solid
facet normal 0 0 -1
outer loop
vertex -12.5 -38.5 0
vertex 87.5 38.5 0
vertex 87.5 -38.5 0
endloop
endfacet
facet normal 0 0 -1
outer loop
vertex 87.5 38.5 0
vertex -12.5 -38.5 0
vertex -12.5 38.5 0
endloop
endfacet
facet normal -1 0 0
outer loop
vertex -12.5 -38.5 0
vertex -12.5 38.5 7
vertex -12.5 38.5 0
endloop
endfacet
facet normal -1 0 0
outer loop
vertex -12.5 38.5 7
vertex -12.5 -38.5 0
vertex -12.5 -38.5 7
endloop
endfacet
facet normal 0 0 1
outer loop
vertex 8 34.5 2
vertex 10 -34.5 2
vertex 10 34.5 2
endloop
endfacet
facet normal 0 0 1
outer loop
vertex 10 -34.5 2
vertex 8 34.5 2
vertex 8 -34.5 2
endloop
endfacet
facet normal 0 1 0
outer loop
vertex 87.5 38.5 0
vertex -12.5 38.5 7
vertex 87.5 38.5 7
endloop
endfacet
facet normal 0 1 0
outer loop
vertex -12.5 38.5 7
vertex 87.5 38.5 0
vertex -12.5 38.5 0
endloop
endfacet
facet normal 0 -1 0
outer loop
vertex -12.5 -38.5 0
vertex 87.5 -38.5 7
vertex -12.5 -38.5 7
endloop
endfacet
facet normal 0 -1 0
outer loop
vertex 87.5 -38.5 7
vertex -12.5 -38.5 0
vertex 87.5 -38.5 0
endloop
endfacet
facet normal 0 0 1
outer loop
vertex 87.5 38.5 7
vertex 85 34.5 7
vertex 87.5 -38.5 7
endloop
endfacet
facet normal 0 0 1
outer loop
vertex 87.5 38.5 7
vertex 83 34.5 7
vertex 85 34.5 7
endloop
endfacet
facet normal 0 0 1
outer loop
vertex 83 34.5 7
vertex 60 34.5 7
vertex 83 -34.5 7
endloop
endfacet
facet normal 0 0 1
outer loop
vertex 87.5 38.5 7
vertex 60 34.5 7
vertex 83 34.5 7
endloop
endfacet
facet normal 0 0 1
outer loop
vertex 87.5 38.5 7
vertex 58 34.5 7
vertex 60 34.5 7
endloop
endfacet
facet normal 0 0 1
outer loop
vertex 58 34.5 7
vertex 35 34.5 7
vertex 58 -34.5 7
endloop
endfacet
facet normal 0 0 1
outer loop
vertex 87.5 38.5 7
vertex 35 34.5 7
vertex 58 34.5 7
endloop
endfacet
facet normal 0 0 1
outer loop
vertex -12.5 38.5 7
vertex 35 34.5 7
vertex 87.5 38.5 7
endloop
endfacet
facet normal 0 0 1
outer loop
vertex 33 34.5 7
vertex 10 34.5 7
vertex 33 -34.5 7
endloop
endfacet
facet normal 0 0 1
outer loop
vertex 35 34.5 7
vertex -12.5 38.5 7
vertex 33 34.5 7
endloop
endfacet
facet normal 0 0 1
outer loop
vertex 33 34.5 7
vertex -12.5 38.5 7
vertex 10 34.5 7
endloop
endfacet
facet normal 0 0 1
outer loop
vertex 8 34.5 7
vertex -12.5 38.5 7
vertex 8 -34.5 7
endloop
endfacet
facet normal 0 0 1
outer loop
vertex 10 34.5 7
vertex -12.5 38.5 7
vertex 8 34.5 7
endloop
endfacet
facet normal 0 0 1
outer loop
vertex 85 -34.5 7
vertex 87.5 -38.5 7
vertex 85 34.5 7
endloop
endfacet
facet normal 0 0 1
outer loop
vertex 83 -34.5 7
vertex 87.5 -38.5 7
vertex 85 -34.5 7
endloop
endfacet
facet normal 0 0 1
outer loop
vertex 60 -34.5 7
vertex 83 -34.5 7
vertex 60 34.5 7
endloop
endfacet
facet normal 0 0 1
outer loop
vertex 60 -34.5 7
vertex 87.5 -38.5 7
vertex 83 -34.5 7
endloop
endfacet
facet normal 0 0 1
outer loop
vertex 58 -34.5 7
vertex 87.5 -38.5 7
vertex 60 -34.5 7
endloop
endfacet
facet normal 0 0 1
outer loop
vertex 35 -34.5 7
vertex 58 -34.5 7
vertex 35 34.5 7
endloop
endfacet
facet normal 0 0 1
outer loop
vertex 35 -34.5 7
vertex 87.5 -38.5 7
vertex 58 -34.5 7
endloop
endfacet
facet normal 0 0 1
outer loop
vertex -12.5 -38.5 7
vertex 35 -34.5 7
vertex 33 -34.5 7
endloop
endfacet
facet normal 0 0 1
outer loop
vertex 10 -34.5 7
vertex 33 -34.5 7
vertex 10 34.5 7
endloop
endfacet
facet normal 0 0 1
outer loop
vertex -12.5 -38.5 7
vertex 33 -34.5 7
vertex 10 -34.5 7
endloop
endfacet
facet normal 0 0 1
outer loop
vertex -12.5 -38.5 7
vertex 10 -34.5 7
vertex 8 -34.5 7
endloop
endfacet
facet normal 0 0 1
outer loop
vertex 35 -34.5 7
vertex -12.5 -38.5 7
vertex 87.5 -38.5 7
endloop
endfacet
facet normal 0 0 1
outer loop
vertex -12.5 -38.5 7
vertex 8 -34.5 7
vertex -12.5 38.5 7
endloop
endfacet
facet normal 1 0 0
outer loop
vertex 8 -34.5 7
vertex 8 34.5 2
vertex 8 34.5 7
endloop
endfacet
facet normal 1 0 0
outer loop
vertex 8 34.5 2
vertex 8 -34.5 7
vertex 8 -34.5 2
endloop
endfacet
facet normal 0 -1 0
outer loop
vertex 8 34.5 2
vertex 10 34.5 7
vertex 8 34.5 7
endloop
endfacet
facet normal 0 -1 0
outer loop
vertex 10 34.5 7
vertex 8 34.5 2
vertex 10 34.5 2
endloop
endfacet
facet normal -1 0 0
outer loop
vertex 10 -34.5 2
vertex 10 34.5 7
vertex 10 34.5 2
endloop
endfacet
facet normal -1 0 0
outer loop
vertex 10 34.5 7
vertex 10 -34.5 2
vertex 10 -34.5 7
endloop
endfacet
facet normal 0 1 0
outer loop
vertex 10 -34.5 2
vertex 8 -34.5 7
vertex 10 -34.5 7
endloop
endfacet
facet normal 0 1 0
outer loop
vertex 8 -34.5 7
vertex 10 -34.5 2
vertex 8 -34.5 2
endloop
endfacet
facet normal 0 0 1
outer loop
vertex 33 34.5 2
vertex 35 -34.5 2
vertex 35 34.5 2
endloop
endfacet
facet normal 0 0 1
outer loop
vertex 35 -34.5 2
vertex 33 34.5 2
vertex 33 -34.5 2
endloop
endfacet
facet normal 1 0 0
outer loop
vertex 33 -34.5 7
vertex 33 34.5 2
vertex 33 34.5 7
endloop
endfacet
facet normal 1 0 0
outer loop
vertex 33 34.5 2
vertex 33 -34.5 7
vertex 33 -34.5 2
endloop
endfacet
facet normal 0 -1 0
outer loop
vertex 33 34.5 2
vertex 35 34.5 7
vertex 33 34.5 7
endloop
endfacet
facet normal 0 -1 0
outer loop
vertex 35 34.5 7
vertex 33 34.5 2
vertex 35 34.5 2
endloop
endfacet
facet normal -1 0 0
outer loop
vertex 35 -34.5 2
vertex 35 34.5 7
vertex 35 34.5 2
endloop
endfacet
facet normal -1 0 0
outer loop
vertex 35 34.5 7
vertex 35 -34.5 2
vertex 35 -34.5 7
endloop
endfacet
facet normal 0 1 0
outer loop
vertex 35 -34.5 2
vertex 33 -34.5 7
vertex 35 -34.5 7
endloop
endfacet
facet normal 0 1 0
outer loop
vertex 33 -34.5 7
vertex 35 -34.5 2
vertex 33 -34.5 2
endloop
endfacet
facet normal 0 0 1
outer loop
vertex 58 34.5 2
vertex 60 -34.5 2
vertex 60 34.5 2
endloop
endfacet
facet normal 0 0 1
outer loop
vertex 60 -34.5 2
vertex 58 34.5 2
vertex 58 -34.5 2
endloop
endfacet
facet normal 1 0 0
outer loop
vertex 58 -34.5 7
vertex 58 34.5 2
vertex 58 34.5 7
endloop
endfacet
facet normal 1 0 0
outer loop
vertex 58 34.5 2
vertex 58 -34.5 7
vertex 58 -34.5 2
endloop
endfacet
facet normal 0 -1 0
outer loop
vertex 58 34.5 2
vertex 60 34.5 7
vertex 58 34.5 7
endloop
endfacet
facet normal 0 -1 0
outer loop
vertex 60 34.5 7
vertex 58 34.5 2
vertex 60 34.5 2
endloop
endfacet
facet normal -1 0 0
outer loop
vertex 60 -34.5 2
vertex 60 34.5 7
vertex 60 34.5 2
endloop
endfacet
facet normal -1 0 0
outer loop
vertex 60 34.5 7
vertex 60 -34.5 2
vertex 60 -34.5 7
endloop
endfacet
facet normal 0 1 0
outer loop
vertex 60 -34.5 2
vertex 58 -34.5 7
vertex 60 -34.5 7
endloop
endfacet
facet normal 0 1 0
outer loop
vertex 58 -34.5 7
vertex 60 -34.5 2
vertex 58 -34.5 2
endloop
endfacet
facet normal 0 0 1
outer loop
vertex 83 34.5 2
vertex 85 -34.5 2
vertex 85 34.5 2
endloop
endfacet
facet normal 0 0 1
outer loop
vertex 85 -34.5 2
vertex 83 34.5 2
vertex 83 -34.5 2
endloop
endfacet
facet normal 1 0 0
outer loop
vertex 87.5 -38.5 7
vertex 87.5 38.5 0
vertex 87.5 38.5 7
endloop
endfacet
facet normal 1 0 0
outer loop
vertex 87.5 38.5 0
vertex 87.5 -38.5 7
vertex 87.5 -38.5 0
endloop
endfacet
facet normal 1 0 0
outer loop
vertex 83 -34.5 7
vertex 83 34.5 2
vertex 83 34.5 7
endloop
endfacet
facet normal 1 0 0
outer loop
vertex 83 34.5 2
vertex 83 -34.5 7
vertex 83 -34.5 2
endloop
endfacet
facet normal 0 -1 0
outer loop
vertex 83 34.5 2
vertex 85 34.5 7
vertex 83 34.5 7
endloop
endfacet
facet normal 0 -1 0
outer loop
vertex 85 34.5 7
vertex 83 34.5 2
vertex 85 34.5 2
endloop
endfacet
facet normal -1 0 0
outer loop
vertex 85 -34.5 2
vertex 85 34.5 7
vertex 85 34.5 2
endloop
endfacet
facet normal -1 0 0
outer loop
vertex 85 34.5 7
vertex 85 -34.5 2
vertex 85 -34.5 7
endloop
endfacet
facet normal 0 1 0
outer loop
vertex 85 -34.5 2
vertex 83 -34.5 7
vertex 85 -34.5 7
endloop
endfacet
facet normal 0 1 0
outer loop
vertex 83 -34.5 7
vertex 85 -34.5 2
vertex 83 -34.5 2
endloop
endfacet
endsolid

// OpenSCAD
slotDepth = 5;

boardLength = 69;
boardWidth = 2;

boardLeftPadding = 3;
boardRightPadding = 20;

baseHeight = 2;
baseLengthPadding = 4;

numberOfTessels = 4;

module piece() {
  color("grey")
  linear_extrude( baseHeight )
  square([ boardLeftPadding + boardRightPadding + boardWidth, boardLength + ( baseLengthPadding * 2 ) ], center = true);

  translate([0,0,baseHeight])
  linear_extrude( slotDepth )

  difference() {
    square([ boardLeftPadding + boardRightPadding + boardWidth, boardLength + ( baseLengthPadding * 2 ) ], center = true);

    translate([ boardRightPadding/2 - boardWidth/2 ,0,0])
    square([ boardWidth, boardLength ], center = true);
  }
}

for( i = [0:numberOfTessels-1]) {
  translate([i* ( boardRightPadding + boardLeftPadding + boardWidth ), 0,0])
  piece();
}
